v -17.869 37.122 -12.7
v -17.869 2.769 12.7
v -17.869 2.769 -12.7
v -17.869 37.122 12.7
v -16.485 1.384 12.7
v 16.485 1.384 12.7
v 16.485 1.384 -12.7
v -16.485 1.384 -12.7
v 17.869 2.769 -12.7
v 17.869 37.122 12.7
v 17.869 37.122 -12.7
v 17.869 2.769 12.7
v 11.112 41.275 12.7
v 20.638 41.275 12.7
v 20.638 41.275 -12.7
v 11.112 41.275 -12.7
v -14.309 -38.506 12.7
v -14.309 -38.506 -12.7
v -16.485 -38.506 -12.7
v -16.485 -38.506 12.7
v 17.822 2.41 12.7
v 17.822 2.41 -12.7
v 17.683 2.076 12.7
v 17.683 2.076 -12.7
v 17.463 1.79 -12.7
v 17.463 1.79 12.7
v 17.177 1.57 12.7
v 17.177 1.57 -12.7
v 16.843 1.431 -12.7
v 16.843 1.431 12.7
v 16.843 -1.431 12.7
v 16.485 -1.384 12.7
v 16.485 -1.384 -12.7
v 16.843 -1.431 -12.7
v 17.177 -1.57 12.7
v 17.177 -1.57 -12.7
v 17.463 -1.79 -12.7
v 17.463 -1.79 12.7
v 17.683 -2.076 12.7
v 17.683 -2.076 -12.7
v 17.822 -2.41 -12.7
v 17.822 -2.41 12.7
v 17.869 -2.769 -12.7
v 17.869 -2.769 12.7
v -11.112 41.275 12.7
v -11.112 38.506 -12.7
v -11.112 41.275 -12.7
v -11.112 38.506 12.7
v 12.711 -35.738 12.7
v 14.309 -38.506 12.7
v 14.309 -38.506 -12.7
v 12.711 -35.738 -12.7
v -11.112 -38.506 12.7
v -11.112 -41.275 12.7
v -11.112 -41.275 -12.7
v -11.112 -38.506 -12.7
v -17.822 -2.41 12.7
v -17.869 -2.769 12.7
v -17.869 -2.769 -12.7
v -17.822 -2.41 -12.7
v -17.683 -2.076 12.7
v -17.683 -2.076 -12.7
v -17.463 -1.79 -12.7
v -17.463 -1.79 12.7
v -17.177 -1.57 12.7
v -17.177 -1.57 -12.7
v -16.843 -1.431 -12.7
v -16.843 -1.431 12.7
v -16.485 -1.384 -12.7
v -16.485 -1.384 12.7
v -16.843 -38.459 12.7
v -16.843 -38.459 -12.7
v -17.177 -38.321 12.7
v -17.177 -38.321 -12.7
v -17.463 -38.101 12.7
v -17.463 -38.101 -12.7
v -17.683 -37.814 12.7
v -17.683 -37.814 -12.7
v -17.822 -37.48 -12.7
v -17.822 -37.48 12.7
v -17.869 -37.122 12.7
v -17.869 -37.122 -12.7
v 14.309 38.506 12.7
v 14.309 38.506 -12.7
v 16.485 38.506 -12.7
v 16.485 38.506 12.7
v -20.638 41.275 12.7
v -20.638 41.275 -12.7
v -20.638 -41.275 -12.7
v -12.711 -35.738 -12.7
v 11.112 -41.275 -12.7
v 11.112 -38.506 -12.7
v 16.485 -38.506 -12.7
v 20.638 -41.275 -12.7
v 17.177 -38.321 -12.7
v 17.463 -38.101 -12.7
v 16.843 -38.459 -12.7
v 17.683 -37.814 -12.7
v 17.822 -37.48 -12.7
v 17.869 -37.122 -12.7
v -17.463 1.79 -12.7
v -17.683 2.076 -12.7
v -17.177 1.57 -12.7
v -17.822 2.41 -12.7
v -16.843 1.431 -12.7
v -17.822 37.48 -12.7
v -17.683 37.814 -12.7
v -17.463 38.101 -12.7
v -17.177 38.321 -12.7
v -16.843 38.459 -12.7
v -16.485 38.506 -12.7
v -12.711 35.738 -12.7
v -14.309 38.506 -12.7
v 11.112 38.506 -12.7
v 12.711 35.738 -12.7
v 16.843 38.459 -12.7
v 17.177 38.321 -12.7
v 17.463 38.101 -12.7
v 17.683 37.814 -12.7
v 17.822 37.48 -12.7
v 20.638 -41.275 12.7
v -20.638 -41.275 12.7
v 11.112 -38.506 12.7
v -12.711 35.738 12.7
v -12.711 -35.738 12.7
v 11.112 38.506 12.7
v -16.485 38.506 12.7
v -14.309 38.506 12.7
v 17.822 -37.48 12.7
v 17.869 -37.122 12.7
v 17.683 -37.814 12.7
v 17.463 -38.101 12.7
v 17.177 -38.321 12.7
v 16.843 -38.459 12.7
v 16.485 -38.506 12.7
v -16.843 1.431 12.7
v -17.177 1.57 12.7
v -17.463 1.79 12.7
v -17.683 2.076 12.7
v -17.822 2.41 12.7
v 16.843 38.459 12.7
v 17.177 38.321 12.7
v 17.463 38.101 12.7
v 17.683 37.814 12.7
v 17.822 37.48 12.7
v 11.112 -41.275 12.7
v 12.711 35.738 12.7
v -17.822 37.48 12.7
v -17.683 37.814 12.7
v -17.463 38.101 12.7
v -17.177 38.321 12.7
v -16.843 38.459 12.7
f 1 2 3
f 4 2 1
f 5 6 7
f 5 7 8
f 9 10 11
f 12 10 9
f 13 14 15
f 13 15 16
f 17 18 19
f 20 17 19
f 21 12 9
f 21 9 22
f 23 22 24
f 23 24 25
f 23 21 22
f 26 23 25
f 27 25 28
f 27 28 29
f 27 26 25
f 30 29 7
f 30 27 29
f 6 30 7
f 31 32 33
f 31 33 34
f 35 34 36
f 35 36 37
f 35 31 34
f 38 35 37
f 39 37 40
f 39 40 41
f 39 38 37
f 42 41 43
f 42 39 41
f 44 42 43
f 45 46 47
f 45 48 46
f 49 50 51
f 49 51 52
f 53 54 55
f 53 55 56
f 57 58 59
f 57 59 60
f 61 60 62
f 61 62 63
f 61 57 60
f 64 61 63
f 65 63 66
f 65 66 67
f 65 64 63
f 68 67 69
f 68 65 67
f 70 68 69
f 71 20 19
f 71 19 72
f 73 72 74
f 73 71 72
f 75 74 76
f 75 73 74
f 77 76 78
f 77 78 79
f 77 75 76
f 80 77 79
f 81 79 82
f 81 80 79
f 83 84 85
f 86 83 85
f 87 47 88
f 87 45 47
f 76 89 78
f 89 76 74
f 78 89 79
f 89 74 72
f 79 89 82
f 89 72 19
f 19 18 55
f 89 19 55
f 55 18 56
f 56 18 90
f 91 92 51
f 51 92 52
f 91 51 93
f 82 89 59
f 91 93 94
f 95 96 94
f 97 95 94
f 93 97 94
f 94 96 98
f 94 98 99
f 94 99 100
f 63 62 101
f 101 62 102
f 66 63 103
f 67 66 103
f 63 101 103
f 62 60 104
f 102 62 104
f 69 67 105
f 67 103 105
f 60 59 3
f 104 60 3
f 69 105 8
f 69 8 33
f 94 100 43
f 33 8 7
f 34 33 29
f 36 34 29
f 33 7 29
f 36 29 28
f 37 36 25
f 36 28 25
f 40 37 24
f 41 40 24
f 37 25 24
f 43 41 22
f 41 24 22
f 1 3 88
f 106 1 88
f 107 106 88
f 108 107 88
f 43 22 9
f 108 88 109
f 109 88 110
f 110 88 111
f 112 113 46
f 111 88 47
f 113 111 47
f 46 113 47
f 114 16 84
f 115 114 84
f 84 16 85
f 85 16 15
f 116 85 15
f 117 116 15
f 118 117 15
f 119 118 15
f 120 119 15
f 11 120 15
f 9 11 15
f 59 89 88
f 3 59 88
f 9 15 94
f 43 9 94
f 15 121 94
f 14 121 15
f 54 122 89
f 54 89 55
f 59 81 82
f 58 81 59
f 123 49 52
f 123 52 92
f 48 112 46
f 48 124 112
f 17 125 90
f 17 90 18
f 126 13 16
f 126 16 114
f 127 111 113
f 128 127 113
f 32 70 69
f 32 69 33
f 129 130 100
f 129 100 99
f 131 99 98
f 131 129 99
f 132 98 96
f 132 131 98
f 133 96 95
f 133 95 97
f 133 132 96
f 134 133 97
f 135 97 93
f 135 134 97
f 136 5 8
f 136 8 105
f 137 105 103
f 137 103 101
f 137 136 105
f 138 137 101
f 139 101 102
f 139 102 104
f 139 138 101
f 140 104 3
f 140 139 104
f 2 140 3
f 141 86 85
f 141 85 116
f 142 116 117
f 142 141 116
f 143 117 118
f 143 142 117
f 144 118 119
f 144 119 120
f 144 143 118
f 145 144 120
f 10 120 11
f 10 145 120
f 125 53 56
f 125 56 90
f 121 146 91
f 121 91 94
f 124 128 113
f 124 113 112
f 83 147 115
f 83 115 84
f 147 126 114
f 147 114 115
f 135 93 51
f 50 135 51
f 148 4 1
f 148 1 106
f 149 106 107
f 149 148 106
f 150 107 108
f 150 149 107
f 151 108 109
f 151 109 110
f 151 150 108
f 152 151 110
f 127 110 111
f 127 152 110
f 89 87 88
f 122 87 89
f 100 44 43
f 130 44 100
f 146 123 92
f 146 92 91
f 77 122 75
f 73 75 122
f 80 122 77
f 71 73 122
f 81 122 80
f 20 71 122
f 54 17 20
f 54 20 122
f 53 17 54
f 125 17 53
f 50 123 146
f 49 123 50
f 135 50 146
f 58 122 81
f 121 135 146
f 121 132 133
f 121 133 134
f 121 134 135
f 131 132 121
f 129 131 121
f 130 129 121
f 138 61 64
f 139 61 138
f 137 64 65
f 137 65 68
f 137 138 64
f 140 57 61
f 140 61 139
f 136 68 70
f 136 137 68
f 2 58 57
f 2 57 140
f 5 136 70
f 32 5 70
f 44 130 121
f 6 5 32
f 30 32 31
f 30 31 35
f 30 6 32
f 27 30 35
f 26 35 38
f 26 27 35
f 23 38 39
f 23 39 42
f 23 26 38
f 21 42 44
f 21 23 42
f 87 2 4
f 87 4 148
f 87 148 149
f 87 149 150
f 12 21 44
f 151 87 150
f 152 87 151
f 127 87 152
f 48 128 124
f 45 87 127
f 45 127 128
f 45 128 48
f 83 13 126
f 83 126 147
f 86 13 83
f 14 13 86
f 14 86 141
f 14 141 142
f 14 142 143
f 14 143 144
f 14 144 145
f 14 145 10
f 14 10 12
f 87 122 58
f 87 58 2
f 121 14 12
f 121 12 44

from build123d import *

# Parameters (mm, degrees)
BASE_EXTRUDE_DEPTH = 12.7


with BuildPart() as part:
    # Sketch1 → Base-Extrude (new, symmetric)
    with BuildSketch(Plane.XY):
        with BuildLine():
            Line((-11.1125, 41.275), (-20.6375, 41.275))
            Line((-20.6375, 41.275), (-20.6375, -41.275))
            Line((-20.6375, -41.275), (-11.1125, -41.275))
            Line((-11.1125, -41.275), (-11.1125, -38.5064))
            Line((-11.1125, -38.5064), (-12.710951958, -35.7378))
            Line((-12.710951958, -35.7378), (-14.309403911, -38.5064))
            Line((-14.309403911, -38.5064), (-16.4846, -38.5064))
            ThreePointArc((-16.4846, -38.5064), (-17.463447917, -38.100947917), (-17.8689, -37.1221))
            Line((-17.8689, -37.1221), (-17.8689, -2.7686))
            ThreePointArc((-17.8689, -2.7686), (-17.463447917, -1.789752083), (-16.4846, -1.3843))
            Line((-16.4846, -1.3843), (16.4846, -1.3843))
            ThreePointArc((16.4846, -1.3843), (17.463447917, -1.789752083), (17.8689, -2.7686))
            Line((17.8689, -2.7686), (17.8689, -37.1221))
            ThreePointArc((17.8689, -37.1221), (17.463447917, -38.100947917), (16.4846, -38.5064))
            Line((16.4846, -38.5064), (14.309403911, -38.5064))
            Line((14.309403911, -38.5064), (12.710951958, -35.7378))
            Line((12.710951958, -35.7378), (11.1125, -38.5064))
            Line((11.1125, -38.5064), (11.1125, -41.275))
            Line((11.1125, -41.275), (20.6375, -41.275))
            Line((20.6375, -41.275), (20.6375, 41.275))
            Line((20.6375, 41.275), (11.1125, 41.275))
            Line((11.1125, 41.275), (11.1125, 38.5064))
            Line((11.1125, 38.5064), (12.710951958, 35.7378))
            Line((12.710951958, 35.7378), (14.309403911, 38.5064))
            Line((14.309403911, 38.5064), (16.4846, 38.5064))
            ThreePointArc((16.4846, 38.5064), (17.463447917, 38.100947917), (17.8689, 37.1221))
            Line((17.8689, 37.1221), (17.8689, 2.7686))
            ThreePointArc((17.8689, 2.7686), (17.463447917, 1.789752083), (16.4846, 1.3843))
            Line((16.4846, 1.3843), (-16.4846, 1.3843))
            ThreePointArc((-16.4846, 1.3843), (-17.463447917, 1.789752083), (-17.8689, 2.7686))
            Line((-17.8689, 2.7686), (-17.8689, 37.1221))
            ThreePointArc((-17.8689, 37.1221), (-17.463447917, 38.100947917), (-16.4846, 38.5064))
            Line((-16.4846, 38.5064), (-14.309403911, 38.5064))
            Line((-14.309403911, 38.5064), (-12.710951958, 35.7378))
            Line((-12.710951958, 35.7378), (-11.1125, 38.5064))
            Line((-11.1125, 38.5064), (-11.1125, 41.275))
        make_face()
    extrude(amount=BASE_EXTRUDE_DEPTH, both=True)


solid = part.part
